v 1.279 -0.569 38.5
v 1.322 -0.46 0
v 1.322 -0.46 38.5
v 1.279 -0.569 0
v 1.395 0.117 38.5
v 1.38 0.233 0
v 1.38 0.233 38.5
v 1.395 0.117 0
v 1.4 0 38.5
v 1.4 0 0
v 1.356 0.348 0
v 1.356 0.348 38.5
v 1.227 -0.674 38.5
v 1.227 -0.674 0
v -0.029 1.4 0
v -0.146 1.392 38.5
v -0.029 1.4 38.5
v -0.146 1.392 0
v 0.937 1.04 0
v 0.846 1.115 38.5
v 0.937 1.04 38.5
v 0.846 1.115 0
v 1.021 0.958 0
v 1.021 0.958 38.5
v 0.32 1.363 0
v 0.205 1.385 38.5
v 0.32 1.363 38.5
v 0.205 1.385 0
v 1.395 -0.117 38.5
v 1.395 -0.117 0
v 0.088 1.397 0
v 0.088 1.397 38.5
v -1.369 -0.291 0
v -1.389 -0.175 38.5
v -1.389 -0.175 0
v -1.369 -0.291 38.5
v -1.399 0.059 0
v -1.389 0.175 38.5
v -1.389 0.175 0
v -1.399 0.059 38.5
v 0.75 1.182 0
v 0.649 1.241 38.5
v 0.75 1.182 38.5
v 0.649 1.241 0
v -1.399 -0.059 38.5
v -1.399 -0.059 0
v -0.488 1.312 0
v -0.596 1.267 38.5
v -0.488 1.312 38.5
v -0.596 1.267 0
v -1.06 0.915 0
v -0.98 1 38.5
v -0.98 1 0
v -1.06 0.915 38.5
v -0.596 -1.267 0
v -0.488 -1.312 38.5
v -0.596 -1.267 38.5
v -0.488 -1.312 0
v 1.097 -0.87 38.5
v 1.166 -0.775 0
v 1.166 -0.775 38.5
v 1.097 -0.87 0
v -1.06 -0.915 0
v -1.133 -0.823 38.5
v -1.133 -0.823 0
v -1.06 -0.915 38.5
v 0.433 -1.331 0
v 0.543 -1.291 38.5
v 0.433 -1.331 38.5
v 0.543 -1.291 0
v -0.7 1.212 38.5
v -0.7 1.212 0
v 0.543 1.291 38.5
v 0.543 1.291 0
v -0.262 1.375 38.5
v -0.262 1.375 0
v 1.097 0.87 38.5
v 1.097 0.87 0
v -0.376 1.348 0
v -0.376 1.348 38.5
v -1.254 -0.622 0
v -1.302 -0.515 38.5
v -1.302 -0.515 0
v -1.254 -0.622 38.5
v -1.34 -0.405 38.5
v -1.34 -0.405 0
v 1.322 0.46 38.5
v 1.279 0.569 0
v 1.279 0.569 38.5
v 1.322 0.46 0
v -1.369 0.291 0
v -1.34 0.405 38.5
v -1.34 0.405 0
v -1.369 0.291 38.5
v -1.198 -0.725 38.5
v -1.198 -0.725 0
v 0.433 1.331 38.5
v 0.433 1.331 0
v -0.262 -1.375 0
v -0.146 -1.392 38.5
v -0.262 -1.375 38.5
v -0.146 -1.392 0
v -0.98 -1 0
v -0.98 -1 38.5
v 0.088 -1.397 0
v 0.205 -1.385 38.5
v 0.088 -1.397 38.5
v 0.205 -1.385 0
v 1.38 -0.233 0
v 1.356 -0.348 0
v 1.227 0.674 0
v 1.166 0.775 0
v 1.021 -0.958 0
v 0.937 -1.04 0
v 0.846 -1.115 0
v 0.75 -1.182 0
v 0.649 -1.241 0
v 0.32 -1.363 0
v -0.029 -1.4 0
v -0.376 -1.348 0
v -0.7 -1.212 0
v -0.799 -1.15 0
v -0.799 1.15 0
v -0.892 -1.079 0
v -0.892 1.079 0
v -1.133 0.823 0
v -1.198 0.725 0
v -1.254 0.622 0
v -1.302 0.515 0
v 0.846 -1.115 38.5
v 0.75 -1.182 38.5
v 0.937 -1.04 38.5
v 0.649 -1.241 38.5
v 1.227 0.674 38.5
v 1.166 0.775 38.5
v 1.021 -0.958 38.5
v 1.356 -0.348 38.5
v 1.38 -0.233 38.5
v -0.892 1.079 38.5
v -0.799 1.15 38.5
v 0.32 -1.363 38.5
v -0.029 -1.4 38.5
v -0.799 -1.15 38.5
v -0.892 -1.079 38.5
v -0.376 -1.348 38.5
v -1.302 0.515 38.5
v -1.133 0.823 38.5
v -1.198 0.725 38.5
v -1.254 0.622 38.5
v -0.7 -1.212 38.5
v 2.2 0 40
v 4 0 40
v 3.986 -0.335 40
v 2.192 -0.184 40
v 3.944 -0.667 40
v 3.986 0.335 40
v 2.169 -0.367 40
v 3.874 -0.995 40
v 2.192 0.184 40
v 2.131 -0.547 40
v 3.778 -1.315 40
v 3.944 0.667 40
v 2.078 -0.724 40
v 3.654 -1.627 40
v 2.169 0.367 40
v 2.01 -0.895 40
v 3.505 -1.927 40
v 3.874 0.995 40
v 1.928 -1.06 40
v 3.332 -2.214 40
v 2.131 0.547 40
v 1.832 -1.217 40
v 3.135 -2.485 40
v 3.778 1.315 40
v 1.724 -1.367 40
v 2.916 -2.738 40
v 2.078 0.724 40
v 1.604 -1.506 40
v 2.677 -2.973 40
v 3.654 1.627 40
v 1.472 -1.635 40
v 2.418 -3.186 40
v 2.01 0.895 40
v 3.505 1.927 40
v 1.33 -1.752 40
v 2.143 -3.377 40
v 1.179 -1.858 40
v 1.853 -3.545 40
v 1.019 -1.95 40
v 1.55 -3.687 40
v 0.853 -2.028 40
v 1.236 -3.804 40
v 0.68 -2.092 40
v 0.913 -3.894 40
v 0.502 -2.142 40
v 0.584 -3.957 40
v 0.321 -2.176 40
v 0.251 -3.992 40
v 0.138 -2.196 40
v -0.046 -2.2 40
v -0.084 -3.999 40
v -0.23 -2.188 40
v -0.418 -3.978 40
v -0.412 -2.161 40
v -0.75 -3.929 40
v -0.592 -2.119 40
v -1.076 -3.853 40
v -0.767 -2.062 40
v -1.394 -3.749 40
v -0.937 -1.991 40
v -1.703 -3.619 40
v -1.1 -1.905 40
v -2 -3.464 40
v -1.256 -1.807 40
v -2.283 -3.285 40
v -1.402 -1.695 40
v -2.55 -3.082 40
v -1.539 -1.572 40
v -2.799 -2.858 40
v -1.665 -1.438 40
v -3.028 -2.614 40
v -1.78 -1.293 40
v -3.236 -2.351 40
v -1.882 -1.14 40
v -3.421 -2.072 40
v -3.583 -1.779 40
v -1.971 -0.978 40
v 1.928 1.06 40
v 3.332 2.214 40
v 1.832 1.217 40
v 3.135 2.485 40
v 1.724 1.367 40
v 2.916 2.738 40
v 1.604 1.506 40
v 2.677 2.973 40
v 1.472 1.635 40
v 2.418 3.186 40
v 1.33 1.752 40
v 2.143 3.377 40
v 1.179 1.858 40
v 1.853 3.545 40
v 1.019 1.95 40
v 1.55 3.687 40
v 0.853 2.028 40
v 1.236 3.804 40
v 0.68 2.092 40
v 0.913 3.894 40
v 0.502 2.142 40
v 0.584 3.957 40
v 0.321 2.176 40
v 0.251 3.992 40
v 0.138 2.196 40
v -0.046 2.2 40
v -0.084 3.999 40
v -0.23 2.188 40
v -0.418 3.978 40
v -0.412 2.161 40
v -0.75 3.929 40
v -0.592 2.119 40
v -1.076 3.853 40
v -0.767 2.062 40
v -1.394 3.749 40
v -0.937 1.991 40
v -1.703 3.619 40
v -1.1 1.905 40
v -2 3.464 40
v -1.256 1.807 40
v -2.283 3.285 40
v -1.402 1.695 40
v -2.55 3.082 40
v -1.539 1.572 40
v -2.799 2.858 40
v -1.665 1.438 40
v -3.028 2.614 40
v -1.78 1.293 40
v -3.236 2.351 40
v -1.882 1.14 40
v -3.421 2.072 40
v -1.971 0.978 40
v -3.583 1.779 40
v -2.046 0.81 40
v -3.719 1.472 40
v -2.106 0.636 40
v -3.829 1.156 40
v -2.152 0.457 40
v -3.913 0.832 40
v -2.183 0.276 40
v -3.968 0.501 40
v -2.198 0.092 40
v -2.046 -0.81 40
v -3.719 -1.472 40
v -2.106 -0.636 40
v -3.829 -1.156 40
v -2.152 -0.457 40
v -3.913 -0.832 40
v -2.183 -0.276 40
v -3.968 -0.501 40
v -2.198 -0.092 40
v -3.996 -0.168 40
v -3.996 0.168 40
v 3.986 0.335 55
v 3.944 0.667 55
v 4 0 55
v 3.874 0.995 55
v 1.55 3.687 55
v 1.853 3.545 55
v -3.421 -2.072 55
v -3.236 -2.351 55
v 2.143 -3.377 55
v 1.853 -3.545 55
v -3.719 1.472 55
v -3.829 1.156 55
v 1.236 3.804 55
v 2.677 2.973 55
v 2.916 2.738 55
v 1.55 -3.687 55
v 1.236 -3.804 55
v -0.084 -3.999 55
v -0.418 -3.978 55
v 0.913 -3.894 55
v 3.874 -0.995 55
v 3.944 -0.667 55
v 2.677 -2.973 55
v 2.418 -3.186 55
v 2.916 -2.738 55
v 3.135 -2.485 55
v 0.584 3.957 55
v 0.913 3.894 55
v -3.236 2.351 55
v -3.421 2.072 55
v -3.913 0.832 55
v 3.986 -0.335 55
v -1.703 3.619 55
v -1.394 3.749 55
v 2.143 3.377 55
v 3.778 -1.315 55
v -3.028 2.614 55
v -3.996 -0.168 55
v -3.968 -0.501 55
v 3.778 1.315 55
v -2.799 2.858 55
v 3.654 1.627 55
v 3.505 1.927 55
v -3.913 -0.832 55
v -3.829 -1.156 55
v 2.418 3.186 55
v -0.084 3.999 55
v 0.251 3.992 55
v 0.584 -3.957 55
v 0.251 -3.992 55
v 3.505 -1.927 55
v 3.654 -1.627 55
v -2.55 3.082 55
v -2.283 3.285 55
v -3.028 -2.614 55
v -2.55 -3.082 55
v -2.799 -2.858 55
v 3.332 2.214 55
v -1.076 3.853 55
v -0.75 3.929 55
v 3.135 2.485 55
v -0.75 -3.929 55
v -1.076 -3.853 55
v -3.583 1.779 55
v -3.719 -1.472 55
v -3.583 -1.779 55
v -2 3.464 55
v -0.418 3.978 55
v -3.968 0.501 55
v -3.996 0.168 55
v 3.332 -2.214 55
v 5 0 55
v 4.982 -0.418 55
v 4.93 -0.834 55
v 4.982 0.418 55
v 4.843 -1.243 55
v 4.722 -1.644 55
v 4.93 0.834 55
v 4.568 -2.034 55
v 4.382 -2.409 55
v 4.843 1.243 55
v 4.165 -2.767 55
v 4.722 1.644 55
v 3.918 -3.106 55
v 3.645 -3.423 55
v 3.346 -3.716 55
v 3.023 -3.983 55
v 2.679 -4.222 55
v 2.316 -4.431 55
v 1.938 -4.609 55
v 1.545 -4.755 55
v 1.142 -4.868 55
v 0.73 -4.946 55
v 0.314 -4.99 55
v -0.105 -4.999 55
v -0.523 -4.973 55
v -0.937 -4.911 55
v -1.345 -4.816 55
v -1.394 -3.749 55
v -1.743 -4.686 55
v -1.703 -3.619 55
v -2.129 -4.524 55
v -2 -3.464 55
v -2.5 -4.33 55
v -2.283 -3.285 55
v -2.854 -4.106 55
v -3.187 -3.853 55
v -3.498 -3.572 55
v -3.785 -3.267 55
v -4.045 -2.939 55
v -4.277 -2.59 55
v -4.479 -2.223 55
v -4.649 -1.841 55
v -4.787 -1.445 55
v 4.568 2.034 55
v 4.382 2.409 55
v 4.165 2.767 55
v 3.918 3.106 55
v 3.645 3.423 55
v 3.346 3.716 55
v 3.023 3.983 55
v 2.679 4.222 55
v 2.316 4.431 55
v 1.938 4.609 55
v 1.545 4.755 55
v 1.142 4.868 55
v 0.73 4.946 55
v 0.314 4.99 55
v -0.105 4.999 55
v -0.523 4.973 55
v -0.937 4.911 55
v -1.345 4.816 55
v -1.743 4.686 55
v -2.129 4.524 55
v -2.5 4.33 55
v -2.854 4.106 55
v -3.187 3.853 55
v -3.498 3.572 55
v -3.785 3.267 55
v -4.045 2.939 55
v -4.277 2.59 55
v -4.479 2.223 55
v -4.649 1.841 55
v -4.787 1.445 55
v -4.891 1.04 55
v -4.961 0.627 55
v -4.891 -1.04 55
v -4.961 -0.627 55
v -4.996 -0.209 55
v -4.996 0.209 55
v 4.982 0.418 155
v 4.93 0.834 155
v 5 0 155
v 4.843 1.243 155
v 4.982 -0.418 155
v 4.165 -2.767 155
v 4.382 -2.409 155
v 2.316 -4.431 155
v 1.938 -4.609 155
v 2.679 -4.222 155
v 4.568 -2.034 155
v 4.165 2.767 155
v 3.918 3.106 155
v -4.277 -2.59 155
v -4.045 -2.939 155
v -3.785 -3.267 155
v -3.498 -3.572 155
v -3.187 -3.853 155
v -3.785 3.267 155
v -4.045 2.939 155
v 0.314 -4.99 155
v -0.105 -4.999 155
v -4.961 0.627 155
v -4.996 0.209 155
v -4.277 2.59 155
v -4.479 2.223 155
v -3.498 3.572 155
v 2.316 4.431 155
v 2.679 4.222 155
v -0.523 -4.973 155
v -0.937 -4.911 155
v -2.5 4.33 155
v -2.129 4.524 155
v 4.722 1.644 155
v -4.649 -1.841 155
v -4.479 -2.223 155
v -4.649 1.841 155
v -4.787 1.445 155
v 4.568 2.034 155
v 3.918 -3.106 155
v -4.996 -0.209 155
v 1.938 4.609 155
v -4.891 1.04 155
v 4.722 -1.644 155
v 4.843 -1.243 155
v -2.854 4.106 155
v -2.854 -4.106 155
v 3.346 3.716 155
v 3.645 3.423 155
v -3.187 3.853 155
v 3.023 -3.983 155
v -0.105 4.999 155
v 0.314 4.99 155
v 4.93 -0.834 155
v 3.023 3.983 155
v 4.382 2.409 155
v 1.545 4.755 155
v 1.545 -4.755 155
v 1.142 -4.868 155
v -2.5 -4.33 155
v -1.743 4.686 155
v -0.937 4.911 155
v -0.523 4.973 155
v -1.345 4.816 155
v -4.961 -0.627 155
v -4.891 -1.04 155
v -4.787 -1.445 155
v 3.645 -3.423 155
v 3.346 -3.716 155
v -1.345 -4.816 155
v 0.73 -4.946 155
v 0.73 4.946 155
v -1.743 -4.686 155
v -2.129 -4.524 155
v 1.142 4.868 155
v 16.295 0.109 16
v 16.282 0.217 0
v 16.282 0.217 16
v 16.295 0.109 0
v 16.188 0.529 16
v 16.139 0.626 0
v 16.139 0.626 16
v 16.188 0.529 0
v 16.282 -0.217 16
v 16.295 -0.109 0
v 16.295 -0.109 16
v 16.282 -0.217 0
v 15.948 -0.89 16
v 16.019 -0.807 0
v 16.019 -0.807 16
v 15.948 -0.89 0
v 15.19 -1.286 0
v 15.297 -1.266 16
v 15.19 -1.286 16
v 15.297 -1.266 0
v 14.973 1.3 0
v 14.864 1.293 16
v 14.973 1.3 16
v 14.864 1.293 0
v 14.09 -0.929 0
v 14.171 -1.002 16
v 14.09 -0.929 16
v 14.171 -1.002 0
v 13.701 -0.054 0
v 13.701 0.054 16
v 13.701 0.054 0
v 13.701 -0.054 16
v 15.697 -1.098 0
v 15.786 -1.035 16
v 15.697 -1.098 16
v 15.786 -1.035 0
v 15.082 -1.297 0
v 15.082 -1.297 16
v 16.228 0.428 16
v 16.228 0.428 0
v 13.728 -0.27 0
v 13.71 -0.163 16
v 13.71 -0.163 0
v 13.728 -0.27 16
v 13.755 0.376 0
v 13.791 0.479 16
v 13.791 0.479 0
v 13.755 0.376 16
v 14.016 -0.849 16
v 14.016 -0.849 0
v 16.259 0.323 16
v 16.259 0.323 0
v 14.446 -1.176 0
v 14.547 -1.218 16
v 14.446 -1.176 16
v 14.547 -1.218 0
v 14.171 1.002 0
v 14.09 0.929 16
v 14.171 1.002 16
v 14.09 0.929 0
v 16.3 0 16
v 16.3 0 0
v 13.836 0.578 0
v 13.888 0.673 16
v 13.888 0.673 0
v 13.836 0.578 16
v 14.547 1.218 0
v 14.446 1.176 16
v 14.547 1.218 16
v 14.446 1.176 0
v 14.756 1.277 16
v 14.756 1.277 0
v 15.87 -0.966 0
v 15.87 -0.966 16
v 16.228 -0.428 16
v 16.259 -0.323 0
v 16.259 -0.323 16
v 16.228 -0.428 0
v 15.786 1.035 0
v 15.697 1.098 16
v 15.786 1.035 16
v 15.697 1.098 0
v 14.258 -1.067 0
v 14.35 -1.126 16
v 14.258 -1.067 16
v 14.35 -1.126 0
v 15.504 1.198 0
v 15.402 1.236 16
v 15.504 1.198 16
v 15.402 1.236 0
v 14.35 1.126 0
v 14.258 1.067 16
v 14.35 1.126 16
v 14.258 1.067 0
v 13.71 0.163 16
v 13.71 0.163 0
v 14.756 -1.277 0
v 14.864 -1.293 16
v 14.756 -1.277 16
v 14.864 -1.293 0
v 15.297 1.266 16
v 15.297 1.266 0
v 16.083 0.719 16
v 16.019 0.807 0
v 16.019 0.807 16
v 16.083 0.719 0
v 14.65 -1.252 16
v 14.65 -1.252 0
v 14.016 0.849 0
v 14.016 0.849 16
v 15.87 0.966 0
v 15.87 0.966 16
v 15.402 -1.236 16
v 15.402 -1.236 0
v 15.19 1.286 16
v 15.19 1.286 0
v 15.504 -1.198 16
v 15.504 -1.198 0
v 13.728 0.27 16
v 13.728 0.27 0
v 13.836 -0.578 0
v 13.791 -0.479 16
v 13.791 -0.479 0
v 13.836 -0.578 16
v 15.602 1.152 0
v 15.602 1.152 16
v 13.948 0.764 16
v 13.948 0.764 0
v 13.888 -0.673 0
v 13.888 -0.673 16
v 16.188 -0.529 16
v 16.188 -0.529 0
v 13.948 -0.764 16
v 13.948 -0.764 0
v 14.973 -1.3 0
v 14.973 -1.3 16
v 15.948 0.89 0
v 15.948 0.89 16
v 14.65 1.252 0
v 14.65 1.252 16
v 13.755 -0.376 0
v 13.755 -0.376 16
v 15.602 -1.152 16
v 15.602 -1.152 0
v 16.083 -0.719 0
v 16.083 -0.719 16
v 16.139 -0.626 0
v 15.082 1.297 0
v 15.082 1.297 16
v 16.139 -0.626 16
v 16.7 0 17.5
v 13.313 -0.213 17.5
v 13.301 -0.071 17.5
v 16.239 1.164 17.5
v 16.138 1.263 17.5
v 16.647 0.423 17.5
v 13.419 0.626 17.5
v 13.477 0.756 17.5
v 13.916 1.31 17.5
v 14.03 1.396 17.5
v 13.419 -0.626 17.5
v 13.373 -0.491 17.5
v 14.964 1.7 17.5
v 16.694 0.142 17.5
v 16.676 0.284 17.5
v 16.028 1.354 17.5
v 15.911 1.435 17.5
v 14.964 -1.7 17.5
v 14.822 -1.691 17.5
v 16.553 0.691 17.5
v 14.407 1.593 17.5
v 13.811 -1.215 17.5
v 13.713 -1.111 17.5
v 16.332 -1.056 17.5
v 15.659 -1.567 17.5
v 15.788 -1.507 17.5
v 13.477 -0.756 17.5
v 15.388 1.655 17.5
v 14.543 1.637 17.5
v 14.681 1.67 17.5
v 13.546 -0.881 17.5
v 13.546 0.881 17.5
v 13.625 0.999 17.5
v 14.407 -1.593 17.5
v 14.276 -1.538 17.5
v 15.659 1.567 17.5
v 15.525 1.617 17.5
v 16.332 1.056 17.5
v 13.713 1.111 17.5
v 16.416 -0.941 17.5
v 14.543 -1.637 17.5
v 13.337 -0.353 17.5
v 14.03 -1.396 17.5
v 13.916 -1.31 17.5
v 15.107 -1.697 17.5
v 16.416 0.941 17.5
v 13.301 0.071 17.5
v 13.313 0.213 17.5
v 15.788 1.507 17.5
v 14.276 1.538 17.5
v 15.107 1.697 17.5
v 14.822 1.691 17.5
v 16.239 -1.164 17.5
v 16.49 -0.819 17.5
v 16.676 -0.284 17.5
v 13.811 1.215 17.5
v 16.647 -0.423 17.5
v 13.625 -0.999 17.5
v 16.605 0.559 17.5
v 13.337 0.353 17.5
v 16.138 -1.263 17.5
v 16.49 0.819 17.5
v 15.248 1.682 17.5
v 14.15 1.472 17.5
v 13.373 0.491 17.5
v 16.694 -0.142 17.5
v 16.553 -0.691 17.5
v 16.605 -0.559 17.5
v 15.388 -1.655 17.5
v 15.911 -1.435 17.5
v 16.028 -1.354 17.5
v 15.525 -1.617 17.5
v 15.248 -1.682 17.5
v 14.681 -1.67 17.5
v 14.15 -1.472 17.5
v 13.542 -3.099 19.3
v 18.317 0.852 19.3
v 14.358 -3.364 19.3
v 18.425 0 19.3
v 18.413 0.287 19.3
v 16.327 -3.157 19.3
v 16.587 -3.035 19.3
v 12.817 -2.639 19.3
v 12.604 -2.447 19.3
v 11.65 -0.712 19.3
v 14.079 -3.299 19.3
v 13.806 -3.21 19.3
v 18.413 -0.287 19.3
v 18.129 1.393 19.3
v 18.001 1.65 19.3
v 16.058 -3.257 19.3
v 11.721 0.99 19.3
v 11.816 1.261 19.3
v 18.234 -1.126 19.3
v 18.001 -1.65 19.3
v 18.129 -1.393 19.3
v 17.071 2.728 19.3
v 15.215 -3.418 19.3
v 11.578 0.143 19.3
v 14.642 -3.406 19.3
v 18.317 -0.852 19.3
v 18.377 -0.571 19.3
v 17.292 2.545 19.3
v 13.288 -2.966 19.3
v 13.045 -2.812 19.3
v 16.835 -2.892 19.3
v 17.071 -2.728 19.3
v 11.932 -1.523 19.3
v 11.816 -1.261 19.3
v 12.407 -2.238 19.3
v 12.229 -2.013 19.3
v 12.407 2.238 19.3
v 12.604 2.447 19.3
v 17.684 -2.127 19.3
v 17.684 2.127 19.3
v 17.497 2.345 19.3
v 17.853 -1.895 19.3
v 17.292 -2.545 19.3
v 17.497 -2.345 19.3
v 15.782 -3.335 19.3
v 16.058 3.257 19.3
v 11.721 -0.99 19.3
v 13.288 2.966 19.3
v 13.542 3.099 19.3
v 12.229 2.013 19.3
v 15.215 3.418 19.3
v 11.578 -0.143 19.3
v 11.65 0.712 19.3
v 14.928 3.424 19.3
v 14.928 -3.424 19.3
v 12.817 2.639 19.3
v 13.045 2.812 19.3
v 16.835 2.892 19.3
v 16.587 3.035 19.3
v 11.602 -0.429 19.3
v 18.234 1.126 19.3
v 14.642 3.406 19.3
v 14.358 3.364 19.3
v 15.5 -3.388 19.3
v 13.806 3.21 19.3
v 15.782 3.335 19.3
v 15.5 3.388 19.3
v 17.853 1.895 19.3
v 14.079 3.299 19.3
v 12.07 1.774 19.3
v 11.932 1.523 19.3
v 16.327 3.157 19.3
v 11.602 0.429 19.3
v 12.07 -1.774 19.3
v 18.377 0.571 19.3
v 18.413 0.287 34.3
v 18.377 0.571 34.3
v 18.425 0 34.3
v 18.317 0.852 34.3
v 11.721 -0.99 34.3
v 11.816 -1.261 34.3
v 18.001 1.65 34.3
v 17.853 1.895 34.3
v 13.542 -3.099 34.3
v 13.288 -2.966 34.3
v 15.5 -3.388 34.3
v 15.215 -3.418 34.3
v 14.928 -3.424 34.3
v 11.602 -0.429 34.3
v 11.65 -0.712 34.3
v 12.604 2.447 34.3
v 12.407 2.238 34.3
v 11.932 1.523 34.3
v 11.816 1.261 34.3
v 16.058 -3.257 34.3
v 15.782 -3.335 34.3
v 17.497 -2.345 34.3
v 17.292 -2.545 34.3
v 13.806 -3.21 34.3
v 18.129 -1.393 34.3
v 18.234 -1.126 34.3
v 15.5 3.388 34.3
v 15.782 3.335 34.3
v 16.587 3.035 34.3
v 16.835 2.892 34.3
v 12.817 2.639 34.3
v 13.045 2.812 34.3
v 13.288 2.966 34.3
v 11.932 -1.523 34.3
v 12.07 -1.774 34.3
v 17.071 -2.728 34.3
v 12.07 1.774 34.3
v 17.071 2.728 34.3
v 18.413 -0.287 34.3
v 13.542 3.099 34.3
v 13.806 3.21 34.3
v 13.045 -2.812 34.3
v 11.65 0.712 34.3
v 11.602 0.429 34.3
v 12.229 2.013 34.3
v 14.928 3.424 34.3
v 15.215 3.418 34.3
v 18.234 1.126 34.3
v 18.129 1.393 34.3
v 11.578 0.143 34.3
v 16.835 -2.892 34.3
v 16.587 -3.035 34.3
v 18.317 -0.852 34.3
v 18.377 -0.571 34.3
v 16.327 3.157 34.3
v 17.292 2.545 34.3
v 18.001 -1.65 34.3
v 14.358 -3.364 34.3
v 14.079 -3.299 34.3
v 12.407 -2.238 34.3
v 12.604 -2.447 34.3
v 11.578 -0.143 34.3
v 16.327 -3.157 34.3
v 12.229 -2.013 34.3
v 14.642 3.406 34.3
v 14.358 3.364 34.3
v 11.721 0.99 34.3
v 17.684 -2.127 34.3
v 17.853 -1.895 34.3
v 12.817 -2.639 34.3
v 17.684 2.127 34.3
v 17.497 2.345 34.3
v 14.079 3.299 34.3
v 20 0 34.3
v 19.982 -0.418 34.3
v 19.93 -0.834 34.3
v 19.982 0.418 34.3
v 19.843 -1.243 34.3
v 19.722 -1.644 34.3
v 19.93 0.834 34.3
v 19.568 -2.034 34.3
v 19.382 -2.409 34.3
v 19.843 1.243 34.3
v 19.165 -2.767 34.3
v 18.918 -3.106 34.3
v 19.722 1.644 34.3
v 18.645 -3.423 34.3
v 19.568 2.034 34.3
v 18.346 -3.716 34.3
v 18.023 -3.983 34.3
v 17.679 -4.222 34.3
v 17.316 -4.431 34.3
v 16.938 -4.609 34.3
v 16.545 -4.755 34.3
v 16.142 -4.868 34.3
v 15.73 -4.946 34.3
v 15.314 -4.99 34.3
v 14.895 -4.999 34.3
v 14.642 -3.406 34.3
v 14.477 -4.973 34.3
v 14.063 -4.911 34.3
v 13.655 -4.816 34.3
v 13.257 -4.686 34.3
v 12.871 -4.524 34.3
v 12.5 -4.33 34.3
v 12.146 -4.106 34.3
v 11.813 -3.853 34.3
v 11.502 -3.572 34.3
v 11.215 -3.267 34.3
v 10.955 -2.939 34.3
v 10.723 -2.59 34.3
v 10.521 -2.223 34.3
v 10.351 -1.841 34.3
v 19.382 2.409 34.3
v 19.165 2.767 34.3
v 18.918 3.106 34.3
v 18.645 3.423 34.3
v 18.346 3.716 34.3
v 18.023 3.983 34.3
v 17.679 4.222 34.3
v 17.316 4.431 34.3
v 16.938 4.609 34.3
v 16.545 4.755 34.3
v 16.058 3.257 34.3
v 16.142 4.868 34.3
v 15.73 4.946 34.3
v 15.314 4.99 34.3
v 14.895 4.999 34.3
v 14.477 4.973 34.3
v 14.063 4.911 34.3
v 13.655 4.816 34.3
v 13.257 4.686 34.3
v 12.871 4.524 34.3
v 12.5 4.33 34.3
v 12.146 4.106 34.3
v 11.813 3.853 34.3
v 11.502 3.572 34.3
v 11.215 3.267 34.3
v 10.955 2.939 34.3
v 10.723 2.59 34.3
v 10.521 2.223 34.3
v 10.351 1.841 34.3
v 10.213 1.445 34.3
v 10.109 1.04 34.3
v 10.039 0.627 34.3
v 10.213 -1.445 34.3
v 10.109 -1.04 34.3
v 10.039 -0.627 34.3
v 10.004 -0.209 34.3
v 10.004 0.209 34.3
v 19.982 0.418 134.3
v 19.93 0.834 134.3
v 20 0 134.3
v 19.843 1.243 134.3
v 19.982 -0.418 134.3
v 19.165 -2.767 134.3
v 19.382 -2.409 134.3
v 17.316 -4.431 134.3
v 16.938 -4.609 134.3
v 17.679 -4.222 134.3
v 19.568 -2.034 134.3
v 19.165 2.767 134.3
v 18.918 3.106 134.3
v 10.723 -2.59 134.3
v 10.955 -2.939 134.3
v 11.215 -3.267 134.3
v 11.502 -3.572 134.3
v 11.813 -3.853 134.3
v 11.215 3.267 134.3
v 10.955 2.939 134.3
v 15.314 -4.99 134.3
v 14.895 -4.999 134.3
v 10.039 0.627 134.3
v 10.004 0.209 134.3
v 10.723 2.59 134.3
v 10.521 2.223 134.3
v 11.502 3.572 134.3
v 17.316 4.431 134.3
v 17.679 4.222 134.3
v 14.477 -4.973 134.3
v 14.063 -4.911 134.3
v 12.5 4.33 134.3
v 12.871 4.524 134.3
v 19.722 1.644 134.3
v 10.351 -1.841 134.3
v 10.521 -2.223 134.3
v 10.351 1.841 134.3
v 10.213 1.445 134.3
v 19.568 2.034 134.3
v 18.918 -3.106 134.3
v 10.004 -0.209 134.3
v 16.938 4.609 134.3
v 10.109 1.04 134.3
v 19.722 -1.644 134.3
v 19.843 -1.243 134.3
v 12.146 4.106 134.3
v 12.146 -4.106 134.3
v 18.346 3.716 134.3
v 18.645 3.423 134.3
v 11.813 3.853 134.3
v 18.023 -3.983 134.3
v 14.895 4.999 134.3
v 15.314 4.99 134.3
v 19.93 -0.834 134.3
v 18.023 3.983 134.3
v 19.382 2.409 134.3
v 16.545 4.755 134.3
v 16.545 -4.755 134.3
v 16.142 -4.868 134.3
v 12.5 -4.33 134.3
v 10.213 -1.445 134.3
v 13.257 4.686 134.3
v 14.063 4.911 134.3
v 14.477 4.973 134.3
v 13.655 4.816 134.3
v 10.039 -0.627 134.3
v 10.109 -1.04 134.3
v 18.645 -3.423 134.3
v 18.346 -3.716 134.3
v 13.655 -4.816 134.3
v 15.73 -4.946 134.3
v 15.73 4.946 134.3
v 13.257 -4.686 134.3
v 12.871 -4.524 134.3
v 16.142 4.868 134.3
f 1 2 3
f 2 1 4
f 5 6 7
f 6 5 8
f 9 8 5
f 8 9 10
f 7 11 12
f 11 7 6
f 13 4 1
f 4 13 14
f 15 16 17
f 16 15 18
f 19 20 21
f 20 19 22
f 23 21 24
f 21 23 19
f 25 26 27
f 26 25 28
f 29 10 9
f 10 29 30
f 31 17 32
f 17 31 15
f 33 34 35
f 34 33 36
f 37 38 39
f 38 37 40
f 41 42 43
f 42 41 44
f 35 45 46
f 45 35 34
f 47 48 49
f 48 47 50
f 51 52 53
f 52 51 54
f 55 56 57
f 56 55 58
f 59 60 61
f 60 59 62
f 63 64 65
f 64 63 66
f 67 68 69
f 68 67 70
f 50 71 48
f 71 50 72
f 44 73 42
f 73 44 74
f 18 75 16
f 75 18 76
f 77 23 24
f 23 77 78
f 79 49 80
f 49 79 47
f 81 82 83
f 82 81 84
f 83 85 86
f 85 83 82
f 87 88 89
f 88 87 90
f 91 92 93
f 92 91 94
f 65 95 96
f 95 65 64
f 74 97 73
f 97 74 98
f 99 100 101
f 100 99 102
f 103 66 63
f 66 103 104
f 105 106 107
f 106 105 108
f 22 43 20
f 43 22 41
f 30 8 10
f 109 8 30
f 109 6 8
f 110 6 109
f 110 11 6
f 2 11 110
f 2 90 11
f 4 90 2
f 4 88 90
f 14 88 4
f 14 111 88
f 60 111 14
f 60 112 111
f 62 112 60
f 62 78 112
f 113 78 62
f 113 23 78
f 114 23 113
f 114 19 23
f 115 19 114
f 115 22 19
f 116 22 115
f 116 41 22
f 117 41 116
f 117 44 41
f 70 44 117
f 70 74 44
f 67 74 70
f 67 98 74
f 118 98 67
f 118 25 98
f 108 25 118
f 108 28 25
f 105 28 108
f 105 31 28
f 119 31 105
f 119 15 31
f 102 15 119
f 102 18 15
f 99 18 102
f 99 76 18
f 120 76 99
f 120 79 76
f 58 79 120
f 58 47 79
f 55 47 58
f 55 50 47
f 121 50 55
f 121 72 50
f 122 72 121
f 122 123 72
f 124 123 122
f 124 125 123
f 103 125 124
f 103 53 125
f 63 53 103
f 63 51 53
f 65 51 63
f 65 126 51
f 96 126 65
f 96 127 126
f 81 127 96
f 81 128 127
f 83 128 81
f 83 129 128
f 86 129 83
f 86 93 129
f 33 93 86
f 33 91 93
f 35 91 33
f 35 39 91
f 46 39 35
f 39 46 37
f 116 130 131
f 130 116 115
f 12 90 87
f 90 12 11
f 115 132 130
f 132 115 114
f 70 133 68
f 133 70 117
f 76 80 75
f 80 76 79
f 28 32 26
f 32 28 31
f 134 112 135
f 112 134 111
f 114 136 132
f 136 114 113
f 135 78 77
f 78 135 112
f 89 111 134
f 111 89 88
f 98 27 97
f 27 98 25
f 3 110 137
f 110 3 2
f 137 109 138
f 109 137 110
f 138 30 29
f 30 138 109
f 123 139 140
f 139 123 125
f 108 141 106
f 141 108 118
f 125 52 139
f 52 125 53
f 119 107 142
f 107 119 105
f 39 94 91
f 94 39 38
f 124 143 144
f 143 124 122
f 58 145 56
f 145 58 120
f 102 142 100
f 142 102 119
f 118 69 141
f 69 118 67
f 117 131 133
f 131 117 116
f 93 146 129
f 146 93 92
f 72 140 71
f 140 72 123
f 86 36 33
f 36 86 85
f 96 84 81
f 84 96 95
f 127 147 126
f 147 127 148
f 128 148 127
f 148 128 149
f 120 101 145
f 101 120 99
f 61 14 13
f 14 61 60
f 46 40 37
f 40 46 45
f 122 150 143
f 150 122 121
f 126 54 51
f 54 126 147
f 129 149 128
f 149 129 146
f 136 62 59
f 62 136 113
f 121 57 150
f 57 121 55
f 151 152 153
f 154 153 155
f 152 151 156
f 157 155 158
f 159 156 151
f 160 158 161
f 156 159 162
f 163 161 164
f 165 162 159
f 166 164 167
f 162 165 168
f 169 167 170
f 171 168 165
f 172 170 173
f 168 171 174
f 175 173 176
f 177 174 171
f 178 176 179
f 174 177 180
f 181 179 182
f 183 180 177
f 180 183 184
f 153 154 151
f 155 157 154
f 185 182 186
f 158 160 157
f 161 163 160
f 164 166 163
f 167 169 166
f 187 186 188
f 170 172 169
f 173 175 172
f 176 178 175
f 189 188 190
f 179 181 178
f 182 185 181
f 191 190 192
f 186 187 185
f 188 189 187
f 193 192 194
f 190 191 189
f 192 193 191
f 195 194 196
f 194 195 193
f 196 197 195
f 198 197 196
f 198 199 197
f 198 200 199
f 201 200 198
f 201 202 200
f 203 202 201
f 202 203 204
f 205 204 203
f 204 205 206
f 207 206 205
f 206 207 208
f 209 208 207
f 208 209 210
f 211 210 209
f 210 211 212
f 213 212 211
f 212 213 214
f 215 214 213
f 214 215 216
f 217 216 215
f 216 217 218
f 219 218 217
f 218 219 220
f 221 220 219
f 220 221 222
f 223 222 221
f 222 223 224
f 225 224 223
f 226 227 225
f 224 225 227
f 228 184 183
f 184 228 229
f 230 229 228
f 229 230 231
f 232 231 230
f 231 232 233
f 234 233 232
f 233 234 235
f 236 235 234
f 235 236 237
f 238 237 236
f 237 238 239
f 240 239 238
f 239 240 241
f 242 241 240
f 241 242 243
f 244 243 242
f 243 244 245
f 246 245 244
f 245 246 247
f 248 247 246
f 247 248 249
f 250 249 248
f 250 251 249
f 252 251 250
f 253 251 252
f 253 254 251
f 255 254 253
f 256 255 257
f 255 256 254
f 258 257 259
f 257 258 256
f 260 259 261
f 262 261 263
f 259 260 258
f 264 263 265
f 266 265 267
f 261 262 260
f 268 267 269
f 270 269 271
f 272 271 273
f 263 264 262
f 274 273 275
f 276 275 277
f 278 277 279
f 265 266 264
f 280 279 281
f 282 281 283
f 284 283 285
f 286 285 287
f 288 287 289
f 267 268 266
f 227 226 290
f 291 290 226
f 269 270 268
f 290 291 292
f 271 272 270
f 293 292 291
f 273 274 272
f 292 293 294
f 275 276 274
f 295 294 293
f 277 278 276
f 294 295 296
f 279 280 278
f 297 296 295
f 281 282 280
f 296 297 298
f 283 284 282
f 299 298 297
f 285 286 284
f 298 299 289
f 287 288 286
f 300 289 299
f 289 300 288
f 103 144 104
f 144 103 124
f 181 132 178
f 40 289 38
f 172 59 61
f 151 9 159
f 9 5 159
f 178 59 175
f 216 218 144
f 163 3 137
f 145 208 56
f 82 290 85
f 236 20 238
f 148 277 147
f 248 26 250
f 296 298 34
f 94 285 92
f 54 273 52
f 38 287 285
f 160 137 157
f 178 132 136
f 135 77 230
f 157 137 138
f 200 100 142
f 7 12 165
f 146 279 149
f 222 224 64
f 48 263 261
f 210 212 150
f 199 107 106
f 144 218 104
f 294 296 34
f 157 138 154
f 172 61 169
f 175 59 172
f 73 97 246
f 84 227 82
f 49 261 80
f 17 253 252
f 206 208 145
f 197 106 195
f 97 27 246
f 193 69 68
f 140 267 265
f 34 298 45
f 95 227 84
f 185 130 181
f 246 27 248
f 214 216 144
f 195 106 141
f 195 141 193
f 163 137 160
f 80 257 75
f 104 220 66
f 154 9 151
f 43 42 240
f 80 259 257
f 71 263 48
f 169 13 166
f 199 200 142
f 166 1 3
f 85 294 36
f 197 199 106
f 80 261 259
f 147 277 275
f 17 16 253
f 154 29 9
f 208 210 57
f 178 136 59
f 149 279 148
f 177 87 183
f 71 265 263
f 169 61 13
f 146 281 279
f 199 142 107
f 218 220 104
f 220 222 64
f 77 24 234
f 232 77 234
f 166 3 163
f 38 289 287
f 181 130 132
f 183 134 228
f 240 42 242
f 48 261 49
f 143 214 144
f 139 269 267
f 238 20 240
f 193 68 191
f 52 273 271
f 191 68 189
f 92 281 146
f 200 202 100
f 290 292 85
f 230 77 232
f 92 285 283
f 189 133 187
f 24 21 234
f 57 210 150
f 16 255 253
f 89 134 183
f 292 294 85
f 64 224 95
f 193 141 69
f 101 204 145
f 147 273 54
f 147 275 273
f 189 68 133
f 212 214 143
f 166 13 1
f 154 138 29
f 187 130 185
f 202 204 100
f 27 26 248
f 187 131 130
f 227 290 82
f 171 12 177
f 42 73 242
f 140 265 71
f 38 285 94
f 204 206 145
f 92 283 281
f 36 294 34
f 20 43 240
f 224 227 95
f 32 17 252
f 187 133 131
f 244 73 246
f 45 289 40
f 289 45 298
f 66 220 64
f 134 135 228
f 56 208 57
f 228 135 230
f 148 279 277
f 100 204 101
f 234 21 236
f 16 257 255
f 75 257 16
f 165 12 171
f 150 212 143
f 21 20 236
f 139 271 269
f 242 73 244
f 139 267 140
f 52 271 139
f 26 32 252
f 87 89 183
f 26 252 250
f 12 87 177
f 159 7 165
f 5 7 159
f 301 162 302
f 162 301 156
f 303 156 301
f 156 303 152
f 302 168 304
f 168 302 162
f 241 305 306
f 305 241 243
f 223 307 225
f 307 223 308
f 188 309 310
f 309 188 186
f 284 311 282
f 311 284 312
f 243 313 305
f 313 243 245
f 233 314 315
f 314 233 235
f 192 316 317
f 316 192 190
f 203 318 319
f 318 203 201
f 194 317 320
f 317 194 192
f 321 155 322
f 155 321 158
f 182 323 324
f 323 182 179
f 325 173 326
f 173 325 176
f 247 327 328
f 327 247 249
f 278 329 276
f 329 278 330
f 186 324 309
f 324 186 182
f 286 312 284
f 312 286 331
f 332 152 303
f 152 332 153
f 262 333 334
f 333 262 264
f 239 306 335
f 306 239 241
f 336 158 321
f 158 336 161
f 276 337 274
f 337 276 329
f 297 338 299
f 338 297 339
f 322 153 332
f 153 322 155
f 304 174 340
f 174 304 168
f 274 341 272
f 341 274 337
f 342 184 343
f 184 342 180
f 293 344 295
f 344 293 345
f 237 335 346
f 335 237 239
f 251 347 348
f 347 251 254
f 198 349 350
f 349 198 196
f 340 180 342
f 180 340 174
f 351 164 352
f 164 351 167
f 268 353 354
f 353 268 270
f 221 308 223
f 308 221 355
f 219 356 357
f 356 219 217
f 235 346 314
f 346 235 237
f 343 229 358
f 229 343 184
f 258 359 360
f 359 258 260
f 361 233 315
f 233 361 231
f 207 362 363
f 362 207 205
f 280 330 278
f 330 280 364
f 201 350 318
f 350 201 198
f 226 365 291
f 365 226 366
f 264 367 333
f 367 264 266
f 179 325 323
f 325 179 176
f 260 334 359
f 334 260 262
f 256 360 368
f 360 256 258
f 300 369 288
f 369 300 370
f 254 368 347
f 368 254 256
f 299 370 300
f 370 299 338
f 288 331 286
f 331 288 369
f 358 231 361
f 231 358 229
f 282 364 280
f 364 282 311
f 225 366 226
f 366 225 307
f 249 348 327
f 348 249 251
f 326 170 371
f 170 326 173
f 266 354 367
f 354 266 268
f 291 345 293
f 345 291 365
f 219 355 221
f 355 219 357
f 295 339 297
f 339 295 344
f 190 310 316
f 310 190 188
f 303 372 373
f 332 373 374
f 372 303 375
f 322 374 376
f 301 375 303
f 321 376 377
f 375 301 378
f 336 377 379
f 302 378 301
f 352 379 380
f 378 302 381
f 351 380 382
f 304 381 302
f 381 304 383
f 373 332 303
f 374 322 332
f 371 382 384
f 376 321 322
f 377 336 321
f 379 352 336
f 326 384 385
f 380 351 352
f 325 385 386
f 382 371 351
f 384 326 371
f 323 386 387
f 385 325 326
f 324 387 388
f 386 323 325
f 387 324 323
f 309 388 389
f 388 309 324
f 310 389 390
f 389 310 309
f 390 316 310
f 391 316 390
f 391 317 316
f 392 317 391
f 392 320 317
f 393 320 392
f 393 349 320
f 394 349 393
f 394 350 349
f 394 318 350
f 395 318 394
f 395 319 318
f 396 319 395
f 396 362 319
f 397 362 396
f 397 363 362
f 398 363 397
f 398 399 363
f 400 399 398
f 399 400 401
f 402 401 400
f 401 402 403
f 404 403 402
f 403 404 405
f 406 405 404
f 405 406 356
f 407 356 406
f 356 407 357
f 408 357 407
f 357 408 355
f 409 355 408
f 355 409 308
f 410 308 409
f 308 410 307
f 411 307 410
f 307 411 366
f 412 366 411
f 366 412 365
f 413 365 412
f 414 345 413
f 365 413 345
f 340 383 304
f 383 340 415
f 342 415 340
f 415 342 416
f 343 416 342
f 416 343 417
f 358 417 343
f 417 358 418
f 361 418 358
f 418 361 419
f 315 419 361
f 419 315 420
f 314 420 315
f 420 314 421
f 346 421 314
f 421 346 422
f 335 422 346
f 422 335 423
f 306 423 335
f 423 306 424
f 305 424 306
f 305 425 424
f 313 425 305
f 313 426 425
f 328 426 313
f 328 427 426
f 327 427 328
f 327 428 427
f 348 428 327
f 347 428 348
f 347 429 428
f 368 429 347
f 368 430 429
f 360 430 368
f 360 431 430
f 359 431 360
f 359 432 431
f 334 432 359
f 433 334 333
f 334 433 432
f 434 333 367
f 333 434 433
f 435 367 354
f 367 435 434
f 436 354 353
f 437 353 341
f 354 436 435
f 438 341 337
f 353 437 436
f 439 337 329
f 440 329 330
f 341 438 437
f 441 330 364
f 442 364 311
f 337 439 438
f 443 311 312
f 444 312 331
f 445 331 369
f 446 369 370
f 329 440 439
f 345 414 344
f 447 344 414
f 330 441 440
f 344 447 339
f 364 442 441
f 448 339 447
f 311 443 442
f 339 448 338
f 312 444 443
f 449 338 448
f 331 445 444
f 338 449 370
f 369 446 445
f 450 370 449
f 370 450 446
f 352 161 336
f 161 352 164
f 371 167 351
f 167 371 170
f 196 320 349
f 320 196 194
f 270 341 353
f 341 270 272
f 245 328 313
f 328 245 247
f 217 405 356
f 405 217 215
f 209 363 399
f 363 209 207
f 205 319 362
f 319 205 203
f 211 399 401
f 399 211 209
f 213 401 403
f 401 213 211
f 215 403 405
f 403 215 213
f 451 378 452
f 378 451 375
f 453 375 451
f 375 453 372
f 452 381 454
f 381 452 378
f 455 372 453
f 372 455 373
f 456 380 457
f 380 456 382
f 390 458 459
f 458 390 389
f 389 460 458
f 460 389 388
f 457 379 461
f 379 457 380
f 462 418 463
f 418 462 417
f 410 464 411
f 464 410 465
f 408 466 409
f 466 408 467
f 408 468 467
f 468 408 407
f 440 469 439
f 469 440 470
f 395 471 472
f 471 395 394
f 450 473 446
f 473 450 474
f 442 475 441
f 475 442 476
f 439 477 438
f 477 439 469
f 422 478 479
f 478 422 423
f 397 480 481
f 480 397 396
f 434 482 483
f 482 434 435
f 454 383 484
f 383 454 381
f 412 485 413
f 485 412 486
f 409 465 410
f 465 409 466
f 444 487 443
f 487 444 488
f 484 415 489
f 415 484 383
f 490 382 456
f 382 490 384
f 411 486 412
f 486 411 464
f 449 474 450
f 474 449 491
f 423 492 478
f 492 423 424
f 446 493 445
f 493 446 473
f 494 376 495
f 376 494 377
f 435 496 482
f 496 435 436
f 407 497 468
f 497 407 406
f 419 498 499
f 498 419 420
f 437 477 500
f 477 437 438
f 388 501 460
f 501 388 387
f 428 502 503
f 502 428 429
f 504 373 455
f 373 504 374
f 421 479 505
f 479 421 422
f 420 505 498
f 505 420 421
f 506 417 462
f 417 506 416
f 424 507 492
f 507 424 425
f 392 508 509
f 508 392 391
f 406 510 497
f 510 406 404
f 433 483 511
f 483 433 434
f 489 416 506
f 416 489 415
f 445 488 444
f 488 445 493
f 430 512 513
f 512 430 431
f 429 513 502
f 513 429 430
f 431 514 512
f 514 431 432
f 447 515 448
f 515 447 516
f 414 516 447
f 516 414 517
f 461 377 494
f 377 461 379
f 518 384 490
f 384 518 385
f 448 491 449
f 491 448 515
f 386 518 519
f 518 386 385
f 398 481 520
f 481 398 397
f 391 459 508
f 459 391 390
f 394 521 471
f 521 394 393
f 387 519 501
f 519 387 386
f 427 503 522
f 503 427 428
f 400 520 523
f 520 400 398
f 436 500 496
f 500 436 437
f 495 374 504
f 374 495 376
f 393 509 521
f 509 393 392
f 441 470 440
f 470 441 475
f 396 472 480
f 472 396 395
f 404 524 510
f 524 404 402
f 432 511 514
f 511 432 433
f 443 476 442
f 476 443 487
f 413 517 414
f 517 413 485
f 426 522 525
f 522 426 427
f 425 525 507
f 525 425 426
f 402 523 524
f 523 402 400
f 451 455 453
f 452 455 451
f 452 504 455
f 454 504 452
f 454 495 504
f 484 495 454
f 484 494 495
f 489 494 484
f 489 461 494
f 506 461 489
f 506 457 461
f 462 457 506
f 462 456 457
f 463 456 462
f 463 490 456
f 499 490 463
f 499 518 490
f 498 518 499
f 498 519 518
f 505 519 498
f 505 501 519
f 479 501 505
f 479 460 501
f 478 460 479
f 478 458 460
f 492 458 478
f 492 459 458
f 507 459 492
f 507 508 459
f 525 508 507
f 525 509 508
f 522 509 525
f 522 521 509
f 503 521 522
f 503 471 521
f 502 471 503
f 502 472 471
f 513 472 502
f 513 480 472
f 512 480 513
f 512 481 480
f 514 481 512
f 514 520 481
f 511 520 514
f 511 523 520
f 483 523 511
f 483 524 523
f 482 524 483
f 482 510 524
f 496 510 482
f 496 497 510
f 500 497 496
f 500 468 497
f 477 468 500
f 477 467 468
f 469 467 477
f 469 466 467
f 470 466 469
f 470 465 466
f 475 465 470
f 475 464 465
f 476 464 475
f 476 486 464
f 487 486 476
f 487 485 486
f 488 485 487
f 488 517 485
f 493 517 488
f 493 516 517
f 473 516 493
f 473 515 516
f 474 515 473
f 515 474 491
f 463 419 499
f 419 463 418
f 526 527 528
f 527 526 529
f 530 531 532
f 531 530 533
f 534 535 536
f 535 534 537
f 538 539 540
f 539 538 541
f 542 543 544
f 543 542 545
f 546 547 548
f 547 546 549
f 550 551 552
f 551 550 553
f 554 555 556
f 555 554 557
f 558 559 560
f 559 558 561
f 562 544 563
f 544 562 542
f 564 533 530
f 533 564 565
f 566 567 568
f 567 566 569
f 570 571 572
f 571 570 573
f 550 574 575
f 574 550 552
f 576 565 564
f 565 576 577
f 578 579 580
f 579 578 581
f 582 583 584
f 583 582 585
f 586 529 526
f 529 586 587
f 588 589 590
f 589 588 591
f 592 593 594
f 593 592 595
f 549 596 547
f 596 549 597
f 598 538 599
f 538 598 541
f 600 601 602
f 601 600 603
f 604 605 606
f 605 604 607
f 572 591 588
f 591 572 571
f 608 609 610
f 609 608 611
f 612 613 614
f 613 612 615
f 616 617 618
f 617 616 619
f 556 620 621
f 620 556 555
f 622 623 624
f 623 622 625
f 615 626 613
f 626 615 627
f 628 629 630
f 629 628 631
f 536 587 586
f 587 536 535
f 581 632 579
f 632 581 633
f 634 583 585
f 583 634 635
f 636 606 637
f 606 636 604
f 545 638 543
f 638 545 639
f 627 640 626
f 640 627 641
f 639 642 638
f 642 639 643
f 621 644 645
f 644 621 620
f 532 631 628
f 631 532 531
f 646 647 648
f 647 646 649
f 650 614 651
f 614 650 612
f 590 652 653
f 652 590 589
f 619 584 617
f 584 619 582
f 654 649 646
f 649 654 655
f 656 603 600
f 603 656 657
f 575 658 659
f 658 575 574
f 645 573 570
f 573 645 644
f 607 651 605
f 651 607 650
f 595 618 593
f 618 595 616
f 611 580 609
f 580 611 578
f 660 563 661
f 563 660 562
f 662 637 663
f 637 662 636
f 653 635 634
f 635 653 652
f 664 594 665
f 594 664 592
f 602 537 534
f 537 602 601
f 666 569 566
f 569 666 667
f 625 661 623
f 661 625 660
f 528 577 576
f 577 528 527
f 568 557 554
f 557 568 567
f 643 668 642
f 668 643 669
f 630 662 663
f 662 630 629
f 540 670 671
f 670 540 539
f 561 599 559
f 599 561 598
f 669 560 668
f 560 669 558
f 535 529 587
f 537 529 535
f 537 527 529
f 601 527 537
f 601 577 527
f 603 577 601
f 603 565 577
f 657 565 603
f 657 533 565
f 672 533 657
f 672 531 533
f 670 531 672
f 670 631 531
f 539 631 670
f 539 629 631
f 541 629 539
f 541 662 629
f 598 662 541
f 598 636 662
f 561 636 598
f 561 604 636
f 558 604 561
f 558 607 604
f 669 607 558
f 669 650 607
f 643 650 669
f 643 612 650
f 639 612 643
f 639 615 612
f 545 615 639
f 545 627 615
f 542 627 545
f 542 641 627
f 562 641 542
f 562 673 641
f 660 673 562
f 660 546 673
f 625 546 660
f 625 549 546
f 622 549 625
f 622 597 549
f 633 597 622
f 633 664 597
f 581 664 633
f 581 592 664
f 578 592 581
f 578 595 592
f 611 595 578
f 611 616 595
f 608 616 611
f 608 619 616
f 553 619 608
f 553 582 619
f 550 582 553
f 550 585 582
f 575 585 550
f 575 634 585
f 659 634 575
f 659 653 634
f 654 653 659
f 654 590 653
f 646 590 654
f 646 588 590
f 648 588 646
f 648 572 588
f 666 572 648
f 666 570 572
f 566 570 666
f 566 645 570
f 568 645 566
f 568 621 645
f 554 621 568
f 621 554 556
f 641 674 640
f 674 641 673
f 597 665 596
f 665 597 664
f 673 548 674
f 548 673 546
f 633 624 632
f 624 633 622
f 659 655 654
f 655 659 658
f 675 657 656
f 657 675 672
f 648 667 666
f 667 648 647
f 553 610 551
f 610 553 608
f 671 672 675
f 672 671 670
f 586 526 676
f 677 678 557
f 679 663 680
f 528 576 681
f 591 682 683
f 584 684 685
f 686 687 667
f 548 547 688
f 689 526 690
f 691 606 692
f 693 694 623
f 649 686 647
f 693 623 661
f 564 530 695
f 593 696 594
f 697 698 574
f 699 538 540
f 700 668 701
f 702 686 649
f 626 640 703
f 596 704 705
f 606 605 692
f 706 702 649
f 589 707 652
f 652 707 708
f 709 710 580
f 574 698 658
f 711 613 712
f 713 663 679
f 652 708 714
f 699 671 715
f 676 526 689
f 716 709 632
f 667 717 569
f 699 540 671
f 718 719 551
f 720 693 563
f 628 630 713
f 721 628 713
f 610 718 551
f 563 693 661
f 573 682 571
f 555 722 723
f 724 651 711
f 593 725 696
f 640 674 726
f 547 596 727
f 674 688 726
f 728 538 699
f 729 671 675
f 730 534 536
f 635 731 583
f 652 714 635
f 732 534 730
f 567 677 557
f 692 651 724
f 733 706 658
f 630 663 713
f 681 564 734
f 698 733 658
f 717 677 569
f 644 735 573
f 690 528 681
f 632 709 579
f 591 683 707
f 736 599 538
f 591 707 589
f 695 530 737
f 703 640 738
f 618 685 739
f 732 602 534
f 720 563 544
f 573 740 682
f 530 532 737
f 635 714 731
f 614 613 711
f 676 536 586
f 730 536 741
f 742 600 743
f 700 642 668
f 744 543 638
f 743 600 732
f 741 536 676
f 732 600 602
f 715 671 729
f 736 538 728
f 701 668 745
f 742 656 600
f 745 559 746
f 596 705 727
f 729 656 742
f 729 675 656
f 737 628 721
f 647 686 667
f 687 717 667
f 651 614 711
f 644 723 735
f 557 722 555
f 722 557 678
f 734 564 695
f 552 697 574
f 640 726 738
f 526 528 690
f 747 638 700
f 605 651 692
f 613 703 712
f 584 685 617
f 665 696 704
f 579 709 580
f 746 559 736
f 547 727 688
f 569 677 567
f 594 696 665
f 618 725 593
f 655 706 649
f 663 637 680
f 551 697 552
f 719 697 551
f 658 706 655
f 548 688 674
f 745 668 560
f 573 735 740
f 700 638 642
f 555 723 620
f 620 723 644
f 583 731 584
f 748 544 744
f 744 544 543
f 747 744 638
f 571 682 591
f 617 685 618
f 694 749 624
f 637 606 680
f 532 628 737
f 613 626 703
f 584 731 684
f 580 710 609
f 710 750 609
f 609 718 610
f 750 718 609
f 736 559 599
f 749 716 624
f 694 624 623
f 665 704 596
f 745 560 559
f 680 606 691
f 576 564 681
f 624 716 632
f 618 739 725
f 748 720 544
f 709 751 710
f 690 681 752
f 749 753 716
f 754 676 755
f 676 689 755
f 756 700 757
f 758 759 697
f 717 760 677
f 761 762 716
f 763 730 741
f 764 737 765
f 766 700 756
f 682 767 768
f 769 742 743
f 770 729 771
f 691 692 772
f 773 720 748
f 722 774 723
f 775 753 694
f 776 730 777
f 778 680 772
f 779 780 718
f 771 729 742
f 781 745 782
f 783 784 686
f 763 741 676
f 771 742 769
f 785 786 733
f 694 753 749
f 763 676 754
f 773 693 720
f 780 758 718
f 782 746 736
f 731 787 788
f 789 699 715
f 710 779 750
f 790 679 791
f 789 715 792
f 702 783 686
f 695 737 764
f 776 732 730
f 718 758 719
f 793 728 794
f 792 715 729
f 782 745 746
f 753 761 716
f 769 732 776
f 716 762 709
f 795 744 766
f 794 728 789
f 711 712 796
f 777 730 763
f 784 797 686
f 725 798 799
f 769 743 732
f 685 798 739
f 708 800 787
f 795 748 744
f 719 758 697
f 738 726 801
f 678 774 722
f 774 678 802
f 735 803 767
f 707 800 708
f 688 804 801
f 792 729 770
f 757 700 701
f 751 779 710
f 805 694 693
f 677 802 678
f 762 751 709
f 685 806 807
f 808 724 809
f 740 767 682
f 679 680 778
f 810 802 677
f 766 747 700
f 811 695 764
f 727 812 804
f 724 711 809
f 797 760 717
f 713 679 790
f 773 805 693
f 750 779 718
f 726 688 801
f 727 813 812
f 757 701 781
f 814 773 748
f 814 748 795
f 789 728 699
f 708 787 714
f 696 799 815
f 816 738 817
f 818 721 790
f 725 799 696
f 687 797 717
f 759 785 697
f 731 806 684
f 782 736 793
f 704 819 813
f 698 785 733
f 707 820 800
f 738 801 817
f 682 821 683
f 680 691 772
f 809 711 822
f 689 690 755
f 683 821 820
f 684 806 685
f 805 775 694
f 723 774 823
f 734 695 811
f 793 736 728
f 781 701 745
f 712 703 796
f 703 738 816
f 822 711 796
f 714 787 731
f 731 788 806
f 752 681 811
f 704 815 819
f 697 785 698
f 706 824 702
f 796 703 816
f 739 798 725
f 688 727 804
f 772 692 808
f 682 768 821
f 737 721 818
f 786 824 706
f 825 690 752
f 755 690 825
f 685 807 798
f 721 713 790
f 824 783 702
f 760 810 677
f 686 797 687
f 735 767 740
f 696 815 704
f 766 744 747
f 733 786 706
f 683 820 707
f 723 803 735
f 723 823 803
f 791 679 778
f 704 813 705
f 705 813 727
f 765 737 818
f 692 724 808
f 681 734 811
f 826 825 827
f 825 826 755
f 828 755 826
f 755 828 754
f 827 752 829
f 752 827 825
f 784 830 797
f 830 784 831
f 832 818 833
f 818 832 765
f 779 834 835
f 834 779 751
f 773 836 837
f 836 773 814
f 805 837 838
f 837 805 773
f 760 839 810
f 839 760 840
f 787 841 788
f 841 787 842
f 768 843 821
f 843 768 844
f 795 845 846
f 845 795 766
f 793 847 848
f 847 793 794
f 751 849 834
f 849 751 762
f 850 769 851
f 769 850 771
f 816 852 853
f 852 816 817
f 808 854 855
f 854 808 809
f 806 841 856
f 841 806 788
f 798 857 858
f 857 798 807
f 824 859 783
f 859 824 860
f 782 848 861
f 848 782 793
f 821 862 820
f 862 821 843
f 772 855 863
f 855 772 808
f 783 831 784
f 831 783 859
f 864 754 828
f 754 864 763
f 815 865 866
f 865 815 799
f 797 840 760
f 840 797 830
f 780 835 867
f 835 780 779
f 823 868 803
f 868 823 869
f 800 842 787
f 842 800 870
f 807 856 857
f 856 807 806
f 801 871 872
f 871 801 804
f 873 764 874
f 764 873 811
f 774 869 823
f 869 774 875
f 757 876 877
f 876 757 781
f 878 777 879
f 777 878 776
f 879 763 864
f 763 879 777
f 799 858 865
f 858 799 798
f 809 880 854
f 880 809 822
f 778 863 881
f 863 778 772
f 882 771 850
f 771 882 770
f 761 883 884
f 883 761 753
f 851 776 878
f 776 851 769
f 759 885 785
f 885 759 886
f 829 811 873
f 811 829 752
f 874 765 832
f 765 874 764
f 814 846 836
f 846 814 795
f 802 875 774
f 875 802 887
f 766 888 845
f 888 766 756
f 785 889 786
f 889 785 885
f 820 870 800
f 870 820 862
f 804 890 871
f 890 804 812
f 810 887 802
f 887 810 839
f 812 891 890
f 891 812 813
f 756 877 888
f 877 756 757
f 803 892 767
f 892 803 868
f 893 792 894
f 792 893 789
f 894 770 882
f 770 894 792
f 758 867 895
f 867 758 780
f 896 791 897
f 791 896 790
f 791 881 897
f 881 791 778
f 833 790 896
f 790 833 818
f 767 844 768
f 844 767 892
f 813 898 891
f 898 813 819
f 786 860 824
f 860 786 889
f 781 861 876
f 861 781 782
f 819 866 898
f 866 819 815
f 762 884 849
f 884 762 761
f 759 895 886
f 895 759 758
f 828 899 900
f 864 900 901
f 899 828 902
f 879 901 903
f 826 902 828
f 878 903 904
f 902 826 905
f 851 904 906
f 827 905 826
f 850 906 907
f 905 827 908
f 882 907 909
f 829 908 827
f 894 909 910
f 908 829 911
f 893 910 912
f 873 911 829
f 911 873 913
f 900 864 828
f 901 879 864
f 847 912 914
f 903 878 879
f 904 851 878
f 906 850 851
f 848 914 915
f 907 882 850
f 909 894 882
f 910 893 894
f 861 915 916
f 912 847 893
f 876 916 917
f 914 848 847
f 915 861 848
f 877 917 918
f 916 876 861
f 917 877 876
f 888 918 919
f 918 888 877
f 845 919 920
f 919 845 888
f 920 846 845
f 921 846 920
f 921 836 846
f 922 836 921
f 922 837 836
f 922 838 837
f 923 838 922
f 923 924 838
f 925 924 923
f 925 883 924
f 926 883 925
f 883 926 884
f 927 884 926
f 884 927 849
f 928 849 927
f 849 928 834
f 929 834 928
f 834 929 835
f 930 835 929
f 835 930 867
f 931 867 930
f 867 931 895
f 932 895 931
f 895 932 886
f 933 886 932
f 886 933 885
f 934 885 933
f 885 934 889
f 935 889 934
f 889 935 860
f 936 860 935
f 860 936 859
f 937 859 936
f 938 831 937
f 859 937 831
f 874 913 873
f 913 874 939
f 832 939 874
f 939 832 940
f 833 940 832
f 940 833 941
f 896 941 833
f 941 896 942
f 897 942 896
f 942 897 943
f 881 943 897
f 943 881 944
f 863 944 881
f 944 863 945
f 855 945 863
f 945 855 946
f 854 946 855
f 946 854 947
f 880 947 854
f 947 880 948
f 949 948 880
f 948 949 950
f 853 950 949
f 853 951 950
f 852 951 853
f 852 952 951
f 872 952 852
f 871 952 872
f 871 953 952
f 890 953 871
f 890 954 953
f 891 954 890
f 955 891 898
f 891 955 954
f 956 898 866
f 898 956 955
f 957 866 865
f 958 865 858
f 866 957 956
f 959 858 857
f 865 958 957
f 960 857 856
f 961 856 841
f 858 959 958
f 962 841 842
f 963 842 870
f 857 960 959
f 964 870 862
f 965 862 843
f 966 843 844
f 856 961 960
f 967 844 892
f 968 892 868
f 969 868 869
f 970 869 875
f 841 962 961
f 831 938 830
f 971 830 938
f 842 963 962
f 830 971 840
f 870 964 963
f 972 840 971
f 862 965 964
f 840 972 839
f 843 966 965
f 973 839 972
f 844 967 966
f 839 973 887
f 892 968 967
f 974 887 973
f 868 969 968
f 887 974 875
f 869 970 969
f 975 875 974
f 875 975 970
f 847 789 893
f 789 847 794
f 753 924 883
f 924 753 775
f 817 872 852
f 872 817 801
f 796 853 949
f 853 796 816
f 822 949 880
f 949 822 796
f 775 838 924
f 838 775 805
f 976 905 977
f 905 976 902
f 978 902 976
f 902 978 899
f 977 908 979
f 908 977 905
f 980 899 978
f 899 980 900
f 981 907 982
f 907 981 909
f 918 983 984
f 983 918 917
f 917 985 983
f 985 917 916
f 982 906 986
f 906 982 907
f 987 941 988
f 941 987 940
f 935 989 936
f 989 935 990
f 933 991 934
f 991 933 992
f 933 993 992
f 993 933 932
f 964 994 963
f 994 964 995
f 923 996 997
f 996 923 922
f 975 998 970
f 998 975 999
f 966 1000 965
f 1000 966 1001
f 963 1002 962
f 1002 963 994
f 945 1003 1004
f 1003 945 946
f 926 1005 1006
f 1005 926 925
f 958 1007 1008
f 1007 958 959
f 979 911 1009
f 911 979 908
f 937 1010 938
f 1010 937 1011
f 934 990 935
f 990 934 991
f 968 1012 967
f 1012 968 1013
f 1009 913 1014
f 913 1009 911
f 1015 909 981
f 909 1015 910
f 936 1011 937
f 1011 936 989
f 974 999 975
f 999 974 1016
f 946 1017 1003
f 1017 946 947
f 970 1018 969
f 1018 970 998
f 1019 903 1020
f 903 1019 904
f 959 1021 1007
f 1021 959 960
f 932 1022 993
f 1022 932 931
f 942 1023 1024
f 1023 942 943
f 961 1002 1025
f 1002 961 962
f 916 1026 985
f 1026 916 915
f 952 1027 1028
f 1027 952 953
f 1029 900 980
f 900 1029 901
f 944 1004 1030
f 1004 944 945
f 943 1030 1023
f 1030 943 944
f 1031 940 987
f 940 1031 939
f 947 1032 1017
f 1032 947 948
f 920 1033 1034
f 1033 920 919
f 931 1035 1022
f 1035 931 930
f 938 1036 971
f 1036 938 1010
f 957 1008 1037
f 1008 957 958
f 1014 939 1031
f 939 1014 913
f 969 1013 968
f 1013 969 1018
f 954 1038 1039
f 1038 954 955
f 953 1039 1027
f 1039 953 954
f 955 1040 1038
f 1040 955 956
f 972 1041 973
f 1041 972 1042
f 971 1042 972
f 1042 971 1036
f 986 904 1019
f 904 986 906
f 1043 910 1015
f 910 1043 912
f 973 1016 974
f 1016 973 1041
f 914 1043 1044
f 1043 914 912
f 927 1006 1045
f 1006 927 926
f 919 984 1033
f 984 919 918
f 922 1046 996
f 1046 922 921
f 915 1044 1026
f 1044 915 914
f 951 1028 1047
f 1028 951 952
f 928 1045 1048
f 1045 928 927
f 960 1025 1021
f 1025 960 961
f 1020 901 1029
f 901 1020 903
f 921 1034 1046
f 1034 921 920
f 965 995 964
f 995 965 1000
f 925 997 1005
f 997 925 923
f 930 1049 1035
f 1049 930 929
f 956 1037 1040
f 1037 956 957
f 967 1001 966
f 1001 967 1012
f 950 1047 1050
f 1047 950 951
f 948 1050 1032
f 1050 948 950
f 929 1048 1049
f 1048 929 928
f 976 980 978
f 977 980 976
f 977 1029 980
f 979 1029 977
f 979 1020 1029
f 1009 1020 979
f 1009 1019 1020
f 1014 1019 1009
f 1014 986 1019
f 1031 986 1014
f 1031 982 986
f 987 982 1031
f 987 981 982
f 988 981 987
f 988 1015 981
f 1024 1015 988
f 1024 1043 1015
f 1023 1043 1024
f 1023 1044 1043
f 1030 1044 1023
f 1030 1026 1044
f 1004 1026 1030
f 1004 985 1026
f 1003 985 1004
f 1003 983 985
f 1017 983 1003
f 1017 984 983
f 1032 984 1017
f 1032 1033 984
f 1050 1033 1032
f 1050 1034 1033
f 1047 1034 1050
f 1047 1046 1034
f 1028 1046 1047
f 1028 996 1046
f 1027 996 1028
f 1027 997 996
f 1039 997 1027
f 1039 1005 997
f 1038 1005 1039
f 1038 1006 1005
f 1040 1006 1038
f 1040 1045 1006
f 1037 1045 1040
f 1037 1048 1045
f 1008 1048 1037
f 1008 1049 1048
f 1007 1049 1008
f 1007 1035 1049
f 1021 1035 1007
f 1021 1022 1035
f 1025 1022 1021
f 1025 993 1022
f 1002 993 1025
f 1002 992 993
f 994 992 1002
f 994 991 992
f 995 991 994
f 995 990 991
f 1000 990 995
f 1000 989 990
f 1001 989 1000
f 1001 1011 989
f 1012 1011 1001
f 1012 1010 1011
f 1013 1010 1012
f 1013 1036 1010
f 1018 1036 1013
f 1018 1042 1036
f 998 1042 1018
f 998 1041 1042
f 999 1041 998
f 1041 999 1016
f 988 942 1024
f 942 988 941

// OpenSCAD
$fn = $preview ? 35 : 75;

screwDriverD = 10;

// Example:
translate([ 0 * 15, 0, 0 ]) screwHole("4.0 x 40 pan head countersunk");
translate([ 1 * 15, 0, 0 ]) screwHole("3.5 x 20 countersunk");

// @see https://cadsetterout.com/resources/wood-screw-head-types/
module screwHole(
  kind,
  screwHeadSpace = 15,
  screwDriverSpace = 100,
) {
  if (kind == "4.0 x 40 pan head countersunk") {
    d = 2.8;
    h = 40;
    head = 8;

    cylinder(d = d, h = h);

    translate([ 0, 0, h - 1.5 ])
    cylinder(d1 = d, d2 = 4.4, h = 1.5); // countersunk cone

    translate([ 0, 0, h ])
    cylinder(d = head, h = screwHeadSpace);

    translate([ 0, 0, h + screwHeadSpace ])
    cylinder(d = screwDriverD, h = screwDriverSpace);
  }

  if (kind == "3.5 x 20 countersunk") {
    d = 2.6;
    h = 16;
    head = 6.85;

    cylinder(d = d, h = h);

    translate([ 0, 0, h ])
    cylinder(d1 = d, d2 = 3.4, h = 1.5); // 1st countersunk cone

    translate([ 0, 0, h + 1.5 ])
    cylinder(d1 = 3.4, d2 = head, h = 1.8); // 2nd countersunk cone

    translate([ 0, 0, h + 1.5 + 1.8 ])
    cylinder(d = head, h = screwHeadSpace);

    translate([ 0, 0, h + 1.5 + 1.8 + screwHeadSpace ])
    cylinder(d = screwDriverD, h = screwDriverSpace);
  }
}
